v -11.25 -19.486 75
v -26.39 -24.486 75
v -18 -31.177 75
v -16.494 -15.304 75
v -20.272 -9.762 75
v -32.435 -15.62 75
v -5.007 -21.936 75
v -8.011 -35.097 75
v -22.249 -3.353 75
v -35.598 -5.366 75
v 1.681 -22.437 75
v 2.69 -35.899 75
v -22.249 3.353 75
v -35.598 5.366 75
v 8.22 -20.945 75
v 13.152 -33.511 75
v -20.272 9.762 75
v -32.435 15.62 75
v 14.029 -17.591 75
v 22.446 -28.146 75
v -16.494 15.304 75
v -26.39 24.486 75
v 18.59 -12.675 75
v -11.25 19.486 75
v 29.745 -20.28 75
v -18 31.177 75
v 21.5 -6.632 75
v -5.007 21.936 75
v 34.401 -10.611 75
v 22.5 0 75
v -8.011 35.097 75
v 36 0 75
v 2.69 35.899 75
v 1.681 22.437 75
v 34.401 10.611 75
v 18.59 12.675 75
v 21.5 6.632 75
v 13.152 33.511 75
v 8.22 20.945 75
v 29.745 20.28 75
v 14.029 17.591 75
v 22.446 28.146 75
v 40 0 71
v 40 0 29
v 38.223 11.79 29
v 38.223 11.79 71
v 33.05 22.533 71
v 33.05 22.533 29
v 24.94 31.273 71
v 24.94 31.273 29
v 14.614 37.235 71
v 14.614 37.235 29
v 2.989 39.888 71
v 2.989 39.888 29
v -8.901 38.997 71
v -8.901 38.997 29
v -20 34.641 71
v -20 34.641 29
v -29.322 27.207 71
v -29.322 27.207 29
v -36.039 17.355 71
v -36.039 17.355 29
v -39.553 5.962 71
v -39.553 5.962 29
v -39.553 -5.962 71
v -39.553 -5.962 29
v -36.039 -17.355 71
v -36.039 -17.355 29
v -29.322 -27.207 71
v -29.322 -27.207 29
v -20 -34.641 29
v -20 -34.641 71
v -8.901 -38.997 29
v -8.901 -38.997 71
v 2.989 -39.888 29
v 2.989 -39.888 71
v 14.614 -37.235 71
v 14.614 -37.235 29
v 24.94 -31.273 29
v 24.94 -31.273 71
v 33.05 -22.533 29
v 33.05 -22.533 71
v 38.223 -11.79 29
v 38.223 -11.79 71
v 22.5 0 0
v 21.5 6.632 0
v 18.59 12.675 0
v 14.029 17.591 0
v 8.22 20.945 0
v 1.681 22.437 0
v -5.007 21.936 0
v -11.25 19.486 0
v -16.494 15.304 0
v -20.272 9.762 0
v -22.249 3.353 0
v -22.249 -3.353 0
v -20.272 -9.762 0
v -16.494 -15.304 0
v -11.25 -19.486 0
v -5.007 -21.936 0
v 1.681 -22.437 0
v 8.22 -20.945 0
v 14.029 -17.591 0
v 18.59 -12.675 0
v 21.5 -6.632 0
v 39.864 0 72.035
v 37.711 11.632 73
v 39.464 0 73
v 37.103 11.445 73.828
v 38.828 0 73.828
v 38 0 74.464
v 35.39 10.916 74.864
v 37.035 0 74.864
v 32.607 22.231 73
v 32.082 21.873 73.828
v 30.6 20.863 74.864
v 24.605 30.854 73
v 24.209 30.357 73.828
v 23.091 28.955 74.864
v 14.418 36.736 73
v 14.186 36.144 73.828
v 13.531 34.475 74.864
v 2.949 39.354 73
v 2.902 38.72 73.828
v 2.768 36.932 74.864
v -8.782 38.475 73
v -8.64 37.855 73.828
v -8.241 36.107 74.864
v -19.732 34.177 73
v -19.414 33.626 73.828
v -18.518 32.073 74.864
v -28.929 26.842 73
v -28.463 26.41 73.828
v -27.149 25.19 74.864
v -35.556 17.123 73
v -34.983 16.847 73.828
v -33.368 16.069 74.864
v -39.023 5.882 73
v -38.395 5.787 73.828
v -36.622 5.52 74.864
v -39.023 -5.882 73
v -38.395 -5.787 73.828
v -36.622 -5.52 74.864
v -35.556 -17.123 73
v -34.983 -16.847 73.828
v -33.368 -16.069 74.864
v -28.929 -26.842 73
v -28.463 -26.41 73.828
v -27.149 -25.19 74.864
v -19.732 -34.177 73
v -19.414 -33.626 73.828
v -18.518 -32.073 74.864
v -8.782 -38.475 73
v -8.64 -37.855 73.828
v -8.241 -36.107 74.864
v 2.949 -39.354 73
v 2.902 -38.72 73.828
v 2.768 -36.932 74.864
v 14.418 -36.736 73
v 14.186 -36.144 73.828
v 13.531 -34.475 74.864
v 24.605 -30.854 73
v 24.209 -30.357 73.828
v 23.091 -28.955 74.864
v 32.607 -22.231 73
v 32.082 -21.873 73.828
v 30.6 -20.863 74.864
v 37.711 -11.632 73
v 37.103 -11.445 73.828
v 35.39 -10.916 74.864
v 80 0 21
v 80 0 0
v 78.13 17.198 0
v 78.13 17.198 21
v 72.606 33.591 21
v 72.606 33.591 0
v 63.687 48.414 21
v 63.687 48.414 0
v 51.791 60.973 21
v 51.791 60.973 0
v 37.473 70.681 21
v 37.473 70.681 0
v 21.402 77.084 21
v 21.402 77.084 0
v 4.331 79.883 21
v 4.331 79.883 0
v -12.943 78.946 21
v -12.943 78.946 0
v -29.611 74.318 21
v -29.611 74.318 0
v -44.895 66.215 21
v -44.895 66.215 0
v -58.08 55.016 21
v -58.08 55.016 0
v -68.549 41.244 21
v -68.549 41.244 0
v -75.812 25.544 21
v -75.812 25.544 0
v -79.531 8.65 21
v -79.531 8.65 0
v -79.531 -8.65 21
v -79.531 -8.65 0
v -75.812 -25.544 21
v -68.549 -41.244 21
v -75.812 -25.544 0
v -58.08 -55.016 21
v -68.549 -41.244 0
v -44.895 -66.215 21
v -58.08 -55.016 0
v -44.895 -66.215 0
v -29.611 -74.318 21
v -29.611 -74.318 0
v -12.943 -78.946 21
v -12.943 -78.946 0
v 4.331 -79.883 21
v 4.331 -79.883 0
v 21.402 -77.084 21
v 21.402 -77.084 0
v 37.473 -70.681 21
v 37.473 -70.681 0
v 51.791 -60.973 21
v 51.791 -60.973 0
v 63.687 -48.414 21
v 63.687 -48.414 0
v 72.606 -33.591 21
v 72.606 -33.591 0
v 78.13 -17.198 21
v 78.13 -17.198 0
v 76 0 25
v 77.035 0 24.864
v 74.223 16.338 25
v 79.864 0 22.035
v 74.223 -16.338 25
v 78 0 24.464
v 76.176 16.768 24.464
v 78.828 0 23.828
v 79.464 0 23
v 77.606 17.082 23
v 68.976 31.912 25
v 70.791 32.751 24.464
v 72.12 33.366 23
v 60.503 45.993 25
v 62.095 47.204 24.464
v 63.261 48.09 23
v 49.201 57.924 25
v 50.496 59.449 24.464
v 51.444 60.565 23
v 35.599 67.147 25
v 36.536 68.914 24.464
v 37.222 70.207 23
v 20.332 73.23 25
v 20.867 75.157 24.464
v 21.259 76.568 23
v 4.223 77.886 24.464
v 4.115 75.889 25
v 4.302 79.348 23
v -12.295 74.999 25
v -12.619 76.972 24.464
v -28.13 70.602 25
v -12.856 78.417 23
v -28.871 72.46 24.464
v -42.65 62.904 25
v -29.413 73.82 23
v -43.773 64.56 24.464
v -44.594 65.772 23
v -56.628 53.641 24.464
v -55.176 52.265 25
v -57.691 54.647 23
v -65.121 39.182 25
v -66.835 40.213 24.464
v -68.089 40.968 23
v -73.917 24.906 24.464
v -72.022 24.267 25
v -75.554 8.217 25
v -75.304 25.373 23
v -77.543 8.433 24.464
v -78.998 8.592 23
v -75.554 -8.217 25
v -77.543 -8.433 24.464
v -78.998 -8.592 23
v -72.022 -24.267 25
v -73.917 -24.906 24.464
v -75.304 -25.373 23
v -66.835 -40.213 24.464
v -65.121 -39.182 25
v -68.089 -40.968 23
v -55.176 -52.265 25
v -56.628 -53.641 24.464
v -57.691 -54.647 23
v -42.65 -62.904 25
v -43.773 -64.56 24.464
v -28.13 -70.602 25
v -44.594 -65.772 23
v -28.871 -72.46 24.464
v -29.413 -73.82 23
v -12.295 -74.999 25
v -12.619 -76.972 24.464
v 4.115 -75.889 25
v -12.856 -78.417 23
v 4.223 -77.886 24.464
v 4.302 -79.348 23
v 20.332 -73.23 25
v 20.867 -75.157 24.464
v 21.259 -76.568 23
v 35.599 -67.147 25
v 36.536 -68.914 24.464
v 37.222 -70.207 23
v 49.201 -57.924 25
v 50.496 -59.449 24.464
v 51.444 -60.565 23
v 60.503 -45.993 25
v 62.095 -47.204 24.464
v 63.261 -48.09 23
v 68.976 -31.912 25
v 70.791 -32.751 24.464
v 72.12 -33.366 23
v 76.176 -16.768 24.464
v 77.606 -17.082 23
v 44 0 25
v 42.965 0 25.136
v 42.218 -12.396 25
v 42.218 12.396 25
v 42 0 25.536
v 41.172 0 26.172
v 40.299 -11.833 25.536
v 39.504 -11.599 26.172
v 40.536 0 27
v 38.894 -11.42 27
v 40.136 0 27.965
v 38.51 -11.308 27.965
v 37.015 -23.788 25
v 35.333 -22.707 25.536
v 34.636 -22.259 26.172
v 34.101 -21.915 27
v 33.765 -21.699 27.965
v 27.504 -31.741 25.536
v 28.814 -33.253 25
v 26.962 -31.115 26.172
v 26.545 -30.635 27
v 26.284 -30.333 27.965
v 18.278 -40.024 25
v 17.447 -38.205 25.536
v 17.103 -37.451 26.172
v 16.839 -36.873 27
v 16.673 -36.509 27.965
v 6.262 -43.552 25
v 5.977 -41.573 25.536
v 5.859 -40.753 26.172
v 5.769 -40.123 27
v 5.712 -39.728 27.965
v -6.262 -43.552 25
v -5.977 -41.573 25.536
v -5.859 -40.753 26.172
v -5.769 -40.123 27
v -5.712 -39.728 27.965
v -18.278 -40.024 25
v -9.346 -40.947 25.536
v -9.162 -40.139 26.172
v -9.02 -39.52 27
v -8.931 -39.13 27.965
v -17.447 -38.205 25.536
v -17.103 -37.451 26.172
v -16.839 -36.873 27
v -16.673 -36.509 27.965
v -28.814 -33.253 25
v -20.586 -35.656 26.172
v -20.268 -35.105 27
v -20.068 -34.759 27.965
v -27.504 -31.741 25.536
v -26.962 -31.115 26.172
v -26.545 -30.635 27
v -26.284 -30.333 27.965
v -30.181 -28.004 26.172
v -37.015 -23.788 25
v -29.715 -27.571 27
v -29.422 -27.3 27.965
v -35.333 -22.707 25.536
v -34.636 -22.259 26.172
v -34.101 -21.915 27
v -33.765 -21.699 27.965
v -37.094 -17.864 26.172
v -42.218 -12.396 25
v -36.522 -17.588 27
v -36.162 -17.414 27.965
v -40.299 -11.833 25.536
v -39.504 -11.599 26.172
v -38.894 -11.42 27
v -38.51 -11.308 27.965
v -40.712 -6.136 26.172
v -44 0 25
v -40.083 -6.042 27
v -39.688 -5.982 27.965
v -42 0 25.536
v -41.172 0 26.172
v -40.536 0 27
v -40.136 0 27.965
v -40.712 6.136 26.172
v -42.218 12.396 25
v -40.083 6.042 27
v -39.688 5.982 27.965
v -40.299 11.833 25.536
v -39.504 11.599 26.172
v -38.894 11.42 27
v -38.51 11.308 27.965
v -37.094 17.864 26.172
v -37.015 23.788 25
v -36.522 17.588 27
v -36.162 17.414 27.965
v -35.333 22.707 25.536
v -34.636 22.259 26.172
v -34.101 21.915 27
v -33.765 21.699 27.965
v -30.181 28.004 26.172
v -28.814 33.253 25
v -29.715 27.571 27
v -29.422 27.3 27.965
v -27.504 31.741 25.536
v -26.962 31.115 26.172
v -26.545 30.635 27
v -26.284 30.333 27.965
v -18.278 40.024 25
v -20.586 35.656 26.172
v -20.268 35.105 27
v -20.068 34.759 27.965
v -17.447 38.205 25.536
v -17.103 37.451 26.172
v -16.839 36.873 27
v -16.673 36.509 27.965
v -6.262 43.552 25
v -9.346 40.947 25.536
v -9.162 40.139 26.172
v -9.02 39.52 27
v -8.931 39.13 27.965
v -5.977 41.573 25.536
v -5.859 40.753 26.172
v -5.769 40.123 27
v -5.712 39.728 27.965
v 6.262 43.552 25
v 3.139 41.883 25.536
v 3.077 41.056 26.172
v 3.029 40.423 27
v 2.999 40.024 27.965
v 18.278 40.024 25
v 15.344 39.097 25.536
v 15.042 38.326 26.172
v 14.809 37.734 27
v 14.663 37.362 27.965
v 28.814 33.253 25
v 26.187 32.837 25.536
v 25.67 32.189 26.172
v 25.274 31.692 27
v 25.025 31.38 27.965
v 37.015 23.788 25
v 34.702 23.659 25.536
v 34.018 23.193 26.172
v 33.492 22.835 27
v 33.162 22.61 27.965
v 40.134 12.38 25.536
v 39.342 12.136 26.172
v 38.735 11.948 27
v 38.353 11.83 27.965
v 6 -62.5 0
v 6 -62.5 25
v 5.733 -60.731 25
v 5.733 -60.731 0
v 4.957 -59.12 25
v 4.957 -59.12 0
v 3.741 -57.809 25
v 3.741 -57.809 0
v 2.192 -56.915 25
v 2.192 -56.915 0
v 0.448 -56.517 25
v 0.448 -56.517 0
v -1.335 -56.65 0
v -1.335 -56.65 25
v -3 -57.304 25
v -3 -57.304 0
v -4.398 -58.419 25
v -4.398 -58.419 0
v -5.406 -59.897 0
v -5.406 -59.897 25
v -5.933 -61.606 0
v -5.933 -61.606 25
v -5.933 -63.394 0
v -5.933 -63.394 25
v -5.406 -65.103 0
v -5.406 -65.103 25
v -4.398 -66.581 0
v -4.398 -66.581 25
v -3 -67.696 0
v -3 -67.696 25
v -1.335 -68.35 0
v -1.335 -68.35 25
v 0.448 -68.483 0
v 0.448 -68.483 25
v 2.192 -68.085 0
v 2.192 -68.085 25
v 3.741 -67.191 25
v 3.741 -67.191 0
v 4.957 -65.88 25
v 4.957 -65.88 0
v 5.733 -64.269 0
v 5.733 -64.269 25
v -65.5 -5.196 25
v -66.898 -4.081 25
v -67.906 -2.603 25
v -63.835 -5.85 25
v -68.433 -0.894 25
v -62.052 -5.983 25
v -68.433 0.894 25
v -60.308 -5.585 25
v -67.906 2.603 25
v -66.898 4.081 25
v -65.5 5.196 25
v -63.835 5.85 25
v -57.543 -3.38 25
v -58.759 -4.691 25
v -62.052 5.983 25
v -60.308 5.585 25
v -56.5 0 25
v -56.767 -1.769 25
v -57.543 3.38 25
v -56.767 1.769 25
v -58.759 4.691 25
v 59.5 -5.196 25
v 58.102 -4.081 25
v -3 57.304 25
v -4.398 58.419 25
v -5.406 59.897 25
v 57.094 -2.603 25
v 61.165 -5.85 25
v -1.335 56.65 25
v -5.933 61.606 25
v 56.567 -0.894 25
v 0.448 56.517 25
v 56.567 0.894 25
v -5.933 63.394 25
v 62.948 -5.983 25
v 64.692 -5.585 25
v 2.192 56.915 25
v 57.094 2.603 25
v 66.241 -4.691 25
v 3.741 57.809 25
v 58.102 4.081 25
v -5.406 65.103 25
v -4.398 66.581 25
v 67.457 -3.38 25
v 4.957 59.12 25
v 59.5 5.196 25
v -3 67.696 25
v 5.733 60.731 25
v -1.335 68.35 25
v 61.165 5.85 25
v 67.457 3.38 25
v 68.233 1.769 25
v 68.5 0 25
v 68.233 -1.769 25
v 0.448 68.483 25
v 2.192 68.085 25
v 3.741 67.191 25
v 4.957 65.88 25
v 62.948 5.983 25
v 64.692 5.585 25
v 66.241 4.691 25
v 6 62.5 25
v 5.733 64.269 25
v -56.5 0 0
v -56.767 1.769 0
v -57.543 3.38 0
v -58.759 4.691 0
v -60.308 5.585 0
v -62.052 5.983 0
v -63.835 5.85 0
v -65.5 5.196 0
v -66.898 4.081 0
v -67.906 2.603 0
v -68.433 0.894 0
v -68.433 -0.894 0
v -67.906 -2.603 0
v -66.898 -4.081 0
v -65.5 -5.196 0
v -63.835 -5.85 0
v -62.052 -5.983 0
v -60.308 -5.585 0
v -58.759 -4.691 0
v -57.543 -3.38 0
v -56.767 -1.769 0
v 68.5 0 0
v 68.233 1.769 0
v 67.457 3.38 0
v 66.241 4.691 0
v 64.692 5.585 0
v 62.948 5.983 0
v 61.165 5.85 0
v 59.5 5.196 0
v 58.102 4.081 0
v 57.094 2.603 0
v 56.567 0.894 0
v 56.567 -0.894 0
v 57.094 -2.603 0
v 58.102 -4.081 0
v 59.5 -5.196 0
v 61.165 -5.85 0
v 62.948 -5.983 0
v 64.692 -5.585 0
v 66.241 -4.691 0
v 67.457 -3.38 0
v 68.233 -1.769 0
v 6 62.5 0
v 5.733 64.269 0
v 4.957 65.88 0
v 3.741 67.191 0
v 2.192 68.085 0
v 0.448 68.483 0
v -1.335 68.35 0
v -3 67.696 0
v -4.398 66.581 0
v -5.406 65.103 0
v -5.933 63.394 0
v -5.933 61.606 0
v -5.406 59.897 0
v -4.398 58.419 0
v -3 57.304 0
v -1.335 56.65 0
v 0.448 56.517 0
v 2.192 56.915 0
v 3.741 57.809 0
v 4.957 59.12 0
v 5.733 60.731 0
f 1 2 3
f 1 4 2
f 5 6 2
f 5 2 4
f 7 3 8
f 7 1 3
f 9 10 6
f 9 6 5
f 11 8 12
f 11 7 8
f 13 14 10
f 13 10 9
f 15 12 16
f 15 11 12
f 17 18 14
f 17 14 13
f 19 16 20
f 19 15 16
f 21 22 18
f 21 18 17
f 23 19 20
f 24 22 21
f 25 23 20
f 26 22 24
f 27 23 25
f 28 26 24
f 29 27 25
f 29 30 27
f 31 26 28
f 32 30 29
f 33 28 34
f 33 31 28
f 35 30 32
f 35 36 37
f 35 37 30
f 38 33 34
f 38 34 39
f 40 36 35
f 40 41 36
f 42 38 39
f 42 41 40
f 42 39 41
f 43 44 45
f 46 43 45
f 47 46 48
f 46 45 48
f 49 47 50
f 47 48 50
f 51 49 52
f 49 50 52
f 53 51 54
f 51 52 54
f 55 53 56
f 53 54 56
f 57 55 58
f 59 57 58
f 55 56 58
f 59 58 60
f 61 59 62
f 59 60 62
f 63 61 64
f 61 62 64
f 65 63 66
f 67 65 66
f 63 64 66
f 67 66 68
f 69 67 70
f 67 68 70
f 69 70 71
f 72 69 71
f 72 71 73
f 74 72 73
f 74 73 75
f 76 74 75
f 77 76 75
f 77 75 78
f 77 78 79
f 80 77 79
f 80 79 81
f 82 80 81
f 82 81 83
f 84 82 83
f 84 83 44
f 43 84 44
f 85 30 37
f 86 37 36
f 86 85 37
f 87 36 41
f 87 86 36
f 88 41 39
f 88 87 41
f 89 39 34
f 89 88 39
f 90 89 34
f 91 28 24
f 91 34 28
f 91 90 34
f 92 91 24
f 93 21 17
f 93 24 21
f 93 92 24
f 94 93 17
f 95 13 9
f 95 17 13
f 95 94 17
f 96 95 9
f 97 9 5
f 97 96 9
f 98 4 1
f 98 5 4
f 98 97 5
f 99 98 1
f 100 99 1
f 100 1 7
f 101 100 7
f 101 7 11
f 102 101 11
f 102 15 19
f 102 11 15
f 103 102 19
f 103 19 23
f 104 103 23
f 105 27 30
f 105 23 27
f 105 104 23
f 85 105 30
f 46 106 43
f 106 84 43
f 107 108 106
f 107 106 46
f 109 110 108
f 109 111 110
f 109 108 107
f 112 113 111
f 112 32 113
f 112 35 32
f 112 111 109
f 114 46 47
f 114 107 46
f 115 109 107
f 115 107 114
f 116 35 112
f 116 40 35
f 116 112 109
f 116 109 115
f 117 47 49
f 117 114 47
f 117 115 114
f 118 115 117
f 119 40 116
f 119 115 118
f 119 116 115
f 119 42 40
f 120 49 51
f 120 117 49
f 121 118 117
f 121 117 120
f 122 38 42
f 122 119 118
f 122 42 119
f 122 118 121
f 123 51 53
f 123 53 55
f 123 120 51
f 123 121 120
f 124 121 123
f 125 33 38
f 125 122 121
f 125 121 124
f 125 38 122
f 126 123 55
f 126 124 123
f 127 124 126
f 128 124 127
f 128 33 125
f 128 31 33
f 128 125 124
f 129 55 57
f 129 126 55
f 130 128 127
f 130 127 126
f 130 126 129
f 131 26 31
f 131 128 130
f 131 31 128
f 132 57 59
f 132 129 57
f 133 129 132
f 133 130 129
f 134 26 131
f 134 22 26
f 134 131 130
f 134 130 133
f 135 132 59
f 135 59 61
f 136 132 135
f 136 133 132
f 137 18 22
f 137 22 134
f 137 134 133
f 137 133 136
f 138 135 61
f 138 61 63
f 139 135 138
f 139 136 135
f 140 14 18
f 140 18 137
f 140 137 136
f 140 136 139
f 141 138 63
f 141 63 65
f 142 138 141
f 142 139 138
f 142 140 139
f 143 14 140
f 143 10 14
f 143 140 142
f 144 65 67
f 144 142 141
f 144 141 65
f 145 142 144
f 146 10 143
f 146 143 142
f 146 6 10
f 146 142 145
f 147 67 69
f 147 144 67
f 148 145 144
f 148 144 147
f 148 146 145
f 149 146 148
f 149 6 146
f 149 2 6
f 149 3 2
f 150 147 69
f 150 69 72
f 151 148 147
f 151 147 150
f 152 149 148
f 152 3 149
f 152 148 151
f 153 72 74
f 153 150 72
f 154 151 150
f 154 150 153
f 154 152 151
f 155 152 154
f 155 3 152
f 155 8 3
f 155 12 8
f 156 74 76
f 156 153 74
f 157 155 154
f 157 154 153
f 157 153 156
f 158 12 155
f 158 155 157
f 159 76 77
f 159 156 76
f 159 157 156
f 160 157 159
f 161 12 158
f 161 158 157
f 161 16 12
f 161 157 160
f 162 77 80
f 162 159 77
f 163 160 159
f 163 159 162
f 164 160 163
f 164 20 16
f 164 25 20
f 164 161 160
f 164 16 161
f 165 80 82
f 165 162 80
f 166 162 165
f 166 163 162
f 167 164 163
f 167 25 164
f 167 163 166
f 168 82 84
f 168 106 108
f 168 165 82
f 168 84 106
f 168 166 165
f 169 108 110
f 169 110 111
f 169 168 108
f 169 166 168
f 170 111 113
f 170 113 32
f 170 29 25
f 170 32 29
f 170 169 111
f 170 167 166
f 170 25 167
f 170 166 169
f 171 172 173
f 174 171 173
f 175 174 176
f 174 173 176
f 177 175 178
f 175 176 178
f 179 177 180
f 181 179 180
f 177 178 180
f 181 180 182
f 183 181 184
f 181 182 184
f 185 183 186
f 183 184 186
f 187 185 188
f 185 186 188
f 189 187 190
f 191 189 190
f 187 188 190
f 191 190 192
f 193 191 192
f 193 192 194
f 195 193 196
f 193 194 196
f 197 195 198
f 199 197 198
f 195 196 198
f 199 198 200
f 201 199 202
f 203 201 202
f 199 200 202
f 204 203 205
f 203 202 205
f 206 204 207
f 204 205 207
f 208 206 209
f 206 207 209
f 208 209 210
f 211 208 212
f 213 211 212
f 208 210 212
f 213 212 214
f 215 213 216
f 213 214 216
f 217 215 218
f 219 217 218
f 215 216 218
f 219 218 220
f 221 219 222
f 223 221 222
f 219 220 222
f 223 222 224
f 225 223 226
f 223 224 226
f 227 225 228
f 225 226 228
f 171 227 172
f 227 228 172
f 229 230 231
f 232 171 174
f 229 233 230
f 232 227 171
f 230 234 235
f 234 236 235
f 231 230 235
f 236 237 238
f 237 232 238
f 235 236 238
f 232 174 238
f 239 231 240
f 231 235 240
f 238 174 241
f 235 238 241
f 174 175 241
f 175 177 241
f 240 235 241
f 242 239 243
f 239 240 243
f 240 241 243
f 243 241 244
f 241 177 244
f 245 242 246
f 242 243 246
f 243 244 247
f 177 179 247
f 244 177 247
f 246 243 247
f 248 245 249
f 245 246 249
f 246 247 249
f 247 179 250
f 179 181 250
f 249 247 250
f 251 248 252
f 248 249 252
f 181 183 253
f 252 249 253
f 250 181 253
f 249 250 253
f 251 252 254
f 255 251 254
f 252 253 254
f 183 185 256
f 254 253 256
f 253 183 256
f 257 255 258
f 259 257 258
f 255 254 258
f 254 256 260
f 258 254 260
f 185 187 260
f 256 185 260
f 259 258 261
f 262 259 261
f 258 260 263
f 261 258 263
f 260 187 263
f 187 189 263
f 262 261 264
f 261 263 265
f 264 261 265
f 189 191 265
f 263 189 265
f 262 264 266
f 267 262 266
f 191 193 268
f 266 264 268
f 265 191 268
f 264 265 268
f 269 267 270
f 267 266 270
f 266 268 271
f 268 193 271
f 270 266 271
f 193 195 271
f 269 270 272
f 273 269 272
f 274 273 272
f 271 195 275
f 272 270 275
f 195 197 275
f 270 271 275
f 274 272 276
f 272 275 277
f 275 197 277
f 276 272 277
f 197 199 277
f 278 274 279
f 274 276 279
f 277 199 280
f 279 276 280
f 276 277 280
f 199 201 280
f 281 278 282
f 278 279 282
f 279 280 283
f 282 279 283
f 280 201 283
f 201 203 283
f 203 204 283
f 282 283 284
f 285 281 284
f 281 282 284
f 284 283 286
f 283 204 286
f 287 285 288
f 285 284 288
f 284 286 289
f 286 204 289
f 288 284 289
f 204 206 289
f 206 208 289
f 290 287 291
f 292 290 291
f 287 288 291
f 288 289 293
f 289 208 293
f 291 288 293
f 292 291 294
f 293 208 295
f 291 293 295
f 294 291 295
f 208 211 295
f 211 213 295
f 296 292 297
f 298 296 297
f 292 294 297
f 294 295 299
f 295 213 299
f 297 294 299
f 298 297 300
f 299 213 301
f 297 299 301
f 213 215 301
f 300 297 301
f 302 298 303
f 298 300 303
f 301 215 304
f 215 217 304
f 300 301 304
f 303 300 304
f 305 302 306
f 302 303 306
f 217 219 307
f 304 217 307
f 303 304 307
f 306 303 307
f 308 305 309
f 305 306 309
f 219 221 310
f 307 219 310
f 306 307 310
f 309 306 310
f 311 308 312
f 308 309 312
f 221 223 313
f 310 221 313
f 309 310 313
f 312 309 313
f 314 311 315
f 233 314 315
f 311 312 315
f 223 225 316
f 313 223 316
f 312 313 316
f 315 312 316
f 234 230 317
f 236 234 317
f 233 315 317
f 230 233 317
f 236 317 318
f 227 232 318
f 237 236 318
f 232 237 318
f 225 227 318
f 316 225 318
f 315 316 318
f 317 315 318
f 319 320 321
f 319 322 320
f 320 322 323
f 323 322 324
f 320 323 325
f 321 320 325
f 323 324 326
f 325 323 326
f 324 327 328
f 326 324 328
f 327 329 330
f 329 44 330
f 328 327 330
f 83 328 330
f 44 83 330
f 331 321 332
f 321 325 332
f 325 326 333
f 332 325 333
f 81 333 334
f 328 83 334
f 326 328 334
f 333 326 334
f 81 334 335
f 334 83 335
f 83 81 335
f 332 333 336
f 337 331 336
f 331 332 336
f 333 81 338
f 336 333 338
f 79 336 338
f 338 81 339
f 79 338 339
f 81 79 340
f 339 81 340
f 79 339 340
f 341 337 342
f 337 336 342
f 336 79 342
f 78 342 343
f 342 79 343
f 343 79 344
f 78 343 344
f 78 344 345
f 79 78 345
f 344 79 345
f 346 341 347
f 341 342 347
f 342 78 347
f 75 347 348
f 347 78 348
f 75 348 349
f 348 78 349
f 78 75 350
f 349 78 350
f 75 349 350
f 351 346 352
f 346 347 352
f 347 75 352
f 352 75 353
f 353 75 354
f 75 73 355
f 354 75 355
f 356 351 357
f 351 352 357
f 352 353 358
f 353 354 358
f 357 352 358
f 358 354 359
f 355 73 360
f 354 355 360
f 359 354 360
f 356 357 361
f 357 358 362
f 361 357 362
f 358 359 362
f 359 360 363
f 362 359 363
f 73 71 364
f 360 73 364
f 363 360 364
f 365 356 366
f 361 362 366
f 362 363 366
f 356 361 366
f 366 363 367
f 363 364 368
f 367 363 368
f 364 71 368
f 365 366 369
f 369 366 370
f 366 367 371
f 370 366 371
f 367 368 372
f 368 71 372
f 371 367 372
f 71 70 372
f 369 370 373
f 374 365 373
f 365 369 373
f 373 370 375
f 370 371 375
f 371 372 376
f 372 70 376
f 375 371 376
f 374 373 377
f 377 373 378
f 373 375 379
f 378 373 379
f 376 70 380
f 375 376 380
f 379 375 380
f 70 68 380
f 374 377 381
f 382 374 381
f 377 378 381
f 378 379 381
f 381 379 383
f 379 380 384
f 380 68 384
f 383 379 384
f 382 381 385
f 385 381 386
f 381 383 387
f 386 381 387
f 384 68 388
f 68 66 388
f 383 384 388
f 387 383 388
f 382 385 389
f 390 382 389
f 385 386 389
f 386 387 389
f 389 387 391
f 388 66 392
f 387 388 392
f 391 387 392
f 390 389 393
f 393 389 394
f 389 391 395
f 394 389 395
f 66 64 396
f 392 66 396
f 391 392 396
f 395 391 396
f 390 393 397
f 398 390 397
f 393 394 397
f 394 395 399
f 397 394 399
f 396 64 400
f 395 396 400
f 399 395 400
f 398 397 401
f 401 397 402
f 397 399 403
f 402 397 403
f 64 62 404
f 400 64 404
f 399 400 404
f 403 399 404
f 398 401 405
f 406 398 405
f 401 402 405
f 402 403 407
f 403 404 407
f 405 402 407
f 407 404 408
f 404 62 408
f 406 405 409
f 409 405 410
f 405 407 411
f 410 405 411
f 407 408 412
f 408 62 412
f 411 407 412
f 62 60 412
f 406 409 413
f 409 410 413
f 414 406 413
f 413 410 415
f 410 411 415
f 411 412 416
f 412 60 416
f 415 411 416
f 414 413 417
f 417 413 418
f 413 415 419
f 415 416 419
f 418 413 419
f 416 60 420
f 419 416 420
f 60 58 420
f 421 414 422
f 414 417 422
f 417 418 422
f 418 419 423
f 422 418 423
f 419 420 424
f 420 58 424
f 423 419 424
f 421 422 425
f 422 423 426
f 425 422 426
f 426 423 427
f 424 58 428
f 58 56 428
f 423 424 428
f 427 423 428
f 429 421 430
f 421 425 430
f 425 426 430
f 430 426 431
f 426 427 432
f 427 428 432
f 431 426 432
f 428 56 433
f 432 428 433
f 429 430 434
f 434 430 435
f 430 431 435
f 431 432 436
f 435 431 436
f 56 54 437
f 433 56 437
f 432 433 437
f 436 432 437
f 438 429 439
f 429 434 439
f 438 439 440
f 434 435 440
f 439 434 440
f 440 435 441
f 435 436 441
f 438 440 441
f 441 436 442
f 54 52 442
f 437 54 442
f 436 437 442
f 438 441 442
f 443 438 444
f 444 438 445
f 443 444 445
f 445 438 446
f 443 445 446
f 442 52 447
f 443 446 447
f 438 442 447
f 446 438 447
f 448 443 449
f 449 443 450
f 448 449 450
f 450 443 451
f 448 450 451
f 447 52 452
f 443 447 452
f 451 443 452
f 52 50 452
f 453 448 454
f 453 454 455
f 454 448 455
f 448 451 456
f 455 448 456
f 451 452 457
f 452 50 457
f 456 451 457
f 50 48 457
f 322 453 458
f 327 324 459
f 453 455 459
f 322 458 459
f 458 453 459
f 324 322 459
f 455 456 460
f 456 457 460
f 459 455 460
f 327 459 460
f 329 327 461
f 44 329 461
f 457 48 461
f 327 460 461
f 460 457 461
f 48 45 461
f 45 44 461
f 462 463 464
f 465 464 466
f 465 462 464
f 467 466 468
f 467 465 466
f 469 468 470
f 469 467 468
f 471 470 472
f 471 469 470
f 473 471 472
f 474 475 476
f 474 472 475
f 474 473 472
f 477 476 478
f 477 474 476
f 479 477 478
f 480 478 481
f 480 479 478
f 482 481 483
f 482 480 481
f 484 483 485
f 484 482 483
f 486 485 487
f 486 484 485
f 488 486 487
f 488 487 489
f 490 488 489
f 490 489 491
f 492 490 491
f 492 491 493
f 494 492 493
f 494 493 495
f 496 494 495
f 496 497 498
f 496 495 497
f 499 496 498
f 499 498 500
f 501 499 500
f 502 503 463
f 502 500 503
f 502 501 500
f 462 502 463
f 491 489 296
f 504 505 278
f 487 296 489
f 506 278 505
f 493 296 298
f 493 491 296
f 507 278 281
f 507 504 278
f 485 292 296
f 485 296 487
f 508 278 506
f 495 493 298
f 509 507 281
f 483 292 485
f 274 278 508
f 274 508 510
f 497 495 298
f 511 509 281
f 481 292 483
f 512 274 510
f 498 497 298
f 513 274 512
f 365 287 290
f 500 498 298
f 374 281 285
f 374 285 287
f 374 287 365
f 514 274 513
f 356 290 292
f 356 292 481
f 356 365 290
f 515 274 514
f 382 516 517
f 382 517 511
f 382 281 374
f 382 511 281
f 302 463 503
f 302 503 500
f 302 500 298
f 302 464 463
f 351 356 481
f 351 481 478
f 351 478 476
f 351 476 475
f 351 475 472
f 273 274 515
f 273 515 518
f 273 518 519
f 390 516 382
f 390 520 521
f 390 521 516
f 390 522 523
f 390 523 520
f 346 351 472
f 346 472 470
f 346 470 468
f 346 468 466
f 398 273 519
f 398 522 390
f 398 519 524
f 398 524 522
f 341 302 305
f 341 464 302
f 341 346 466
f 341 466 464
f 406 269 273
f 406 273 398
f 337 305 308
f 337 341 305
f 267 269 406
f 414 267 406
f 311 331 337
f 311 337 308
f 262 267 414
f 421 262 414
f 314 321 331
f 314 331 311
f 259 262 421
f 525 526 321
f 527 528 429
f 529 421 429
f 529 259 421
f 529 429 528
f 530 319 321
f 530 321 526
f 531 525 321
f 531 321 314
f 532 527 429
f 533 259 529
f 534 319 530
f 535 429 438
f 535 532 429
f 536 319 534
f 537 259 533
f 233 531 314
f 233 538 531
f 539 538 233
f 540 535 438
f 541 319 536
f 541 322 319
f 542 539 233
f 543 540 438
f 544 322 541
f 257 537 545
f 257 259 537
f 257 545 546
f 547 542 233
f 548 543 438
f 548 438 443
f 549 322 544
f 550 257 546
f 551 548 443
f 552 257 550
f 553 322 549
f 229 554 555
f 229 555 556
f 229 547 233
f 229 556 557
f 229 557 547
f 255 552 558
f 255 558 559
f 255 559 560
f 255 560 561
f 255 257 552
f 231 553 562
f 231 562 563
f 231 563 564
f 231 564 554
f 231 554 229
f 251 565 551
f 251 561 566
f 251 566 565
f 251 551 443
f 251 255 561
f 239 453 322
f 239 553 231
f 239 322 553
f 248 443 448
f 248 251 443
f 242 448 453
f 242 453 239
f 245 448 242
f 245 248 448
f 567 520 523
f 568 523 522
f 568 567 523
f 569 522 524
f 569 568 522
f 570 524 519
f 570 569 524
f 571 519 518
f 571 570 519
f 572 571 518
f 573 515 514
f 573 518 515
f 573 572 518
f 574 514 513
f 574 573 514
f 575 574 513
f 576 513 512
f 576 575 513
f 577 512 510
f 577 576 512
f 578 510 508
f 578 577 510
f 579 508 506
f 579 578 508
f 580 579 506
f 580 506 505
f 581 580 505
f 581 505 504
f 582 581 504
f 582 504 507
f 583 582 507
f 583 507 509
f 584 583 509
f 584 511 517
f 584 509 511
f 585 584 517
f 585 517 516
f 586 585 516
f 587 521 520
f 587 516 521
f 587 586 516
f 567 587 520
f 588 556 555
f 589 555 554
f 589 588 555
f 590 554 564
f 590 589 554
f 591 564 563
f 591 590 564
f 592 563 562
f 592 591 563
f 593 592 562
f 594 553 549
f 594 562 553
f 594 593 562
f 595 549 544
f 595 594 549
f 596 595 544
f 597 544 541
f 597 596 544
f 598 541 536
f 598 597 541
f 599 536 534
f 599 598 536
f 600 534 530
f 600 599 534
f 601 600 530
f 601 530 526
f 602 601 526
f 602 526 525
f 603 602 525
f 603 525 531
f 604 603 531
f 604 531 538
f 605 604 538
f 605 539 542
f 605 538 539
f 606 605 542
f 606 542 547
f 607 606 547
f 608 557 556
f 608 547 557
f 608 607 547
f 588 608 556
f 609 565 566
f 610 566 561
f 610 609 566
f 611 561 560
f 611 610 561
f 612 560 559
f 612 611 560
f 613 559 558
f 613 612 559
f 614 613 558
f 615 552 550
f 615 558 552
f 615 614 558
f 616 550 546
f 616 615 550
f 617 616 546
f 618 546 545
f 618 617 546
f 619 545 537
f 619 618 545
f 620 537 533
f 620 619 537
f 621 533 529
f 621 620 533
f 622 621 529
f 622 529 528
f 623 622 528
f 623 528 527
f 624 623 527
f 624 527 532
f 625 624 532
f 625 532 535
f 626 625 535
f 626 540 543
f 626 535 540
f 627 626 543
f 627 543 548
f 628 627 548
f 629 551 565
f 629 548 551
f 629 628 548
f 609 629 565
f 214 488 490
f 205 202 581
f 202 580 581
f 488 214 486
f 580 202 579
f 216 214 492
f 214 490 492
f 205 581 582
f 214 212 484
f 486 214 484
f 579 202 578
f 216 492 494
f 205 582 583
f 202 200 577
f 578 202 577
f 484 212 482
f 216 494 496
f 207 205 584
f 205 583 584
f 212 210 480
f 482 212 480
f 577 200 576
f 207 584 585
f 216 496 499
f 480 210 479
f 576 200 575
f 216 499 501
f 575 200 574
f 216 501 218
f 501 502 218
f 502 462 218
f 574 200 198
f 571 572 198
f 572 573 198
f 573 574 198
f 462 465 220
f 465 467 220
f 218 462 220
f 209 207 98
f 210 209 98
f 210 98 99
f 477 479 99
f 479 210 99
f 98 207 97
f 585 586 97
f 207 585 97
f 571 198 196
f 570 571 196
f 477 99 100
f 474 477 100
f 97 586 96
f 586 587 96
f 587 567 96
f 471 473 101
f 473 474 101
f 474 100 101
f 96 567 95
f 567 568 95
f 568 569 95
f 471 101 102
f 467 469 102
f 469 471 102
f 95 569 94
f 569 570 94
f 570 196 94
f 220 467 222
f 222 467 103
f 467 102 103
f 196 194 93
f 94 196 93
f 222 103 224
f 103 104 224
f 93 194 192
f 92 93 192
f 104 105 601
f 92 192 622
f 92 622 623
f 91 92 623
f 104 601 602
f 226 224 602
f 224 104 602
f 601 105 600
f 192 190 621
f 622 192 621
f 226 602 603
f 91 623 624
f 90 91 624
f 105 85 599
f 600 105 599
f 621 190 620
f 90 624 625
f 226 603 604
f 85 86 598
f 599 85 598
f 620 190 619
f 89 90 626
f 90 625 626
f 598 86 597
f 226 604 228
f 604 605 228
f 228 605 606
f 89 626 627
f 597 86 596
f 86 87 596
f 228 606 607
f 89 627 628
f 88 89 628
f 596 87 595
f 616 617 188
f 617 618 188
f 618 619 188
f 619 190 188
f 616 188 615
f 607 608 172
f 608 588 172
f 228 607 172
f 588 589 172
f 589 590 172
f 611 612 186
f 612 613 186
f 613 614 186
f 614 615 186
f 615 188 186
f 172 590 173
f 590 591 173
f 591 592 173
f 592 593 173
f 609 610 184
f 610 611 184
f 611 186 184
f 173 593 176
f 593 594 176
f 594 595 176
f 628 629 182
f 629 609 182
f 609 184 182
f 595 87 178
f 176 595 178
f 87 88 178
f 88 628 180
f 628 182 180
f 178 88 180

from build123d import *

# Parameters (mm, degrees)
ESQUISSE1_R         = 80
BASE_25MM_DEPTH     = 25
ESQUISSE1_4_R       = 40
AXE75MM_DEPTH       = 75
TROU1_REACH         = 137.739
ESQUISSE1_5_R       = 6
TROU2_REACH         = 137.739
ESQUISSE1_6_R       = 6
TROU3_4_REACH       = 137.739
ESQUISSE1_7_R       = 6
TROUPRINCIPAL_REACH = 137.739
ESQUISSE1_8_R       = 22.5
CONG_1_R            = 4
CONG_2_R            = 4
CONG_3_R            = 4


with BuildPart() as part:
    # Esquisse1 → Base 25mm (new body)
    with BuildSketch(Plane.XY):
        Circle(ESQUISSE1_R)
    extrude(amount=BASE_25MM_DEPTH)

    # Esquisse1<4> → axe75mm (add)
    with BuildSketch(Plane.XY):
        Circle(ESQUISSE1_4_R)
    extrude(amount=AXE75MM_DEPTH)

    # Esquisse1<5> → Trou1 (cut, up to next)
    with BuildSketch(Plane.XY, mode=Mode.PRIVATE) as trou1_sk1:
        with Locations((0, 62.5)):
            Circle(ESQUISSE1_5_R)
    trou1_tool1 = extrude(trou1_sk1.sketch, amount=TROU1_REACH, mode=Mode.PRIVATE) & part.part
    add(trou1_tool1.solids().sort_by_distance((0, 62.5, 0))[0], mode=Mode.SUBTRACT)

    # Esquisse1<6> → Trou2 (cut, up to next)
    with BuildSketch(Plane.XY, mode=Mode.PRIVATE) as trou2_sk1:
        with Locations((-62.5, 0)):
            Circle(ESQUISSE1_6_R)
    trou2_tool1 = extrude(trou2_sk1.sketch, amount=TROU2_REACH, mode=Mode.PRIVATE) & part.part
    add(trou2_tool1.solids().sort_by_distance((-62.5, 0, 0))[0], mode=Mode.SUBTRACT)

    # Esquisse1<7> → Trou3&4 (cut, up to next)
    with BuildSketch(Plane.XY, mode=Mode.PRIVATE) as trou3_4_sk1:
        with Locations((62.5, 0)):
            Circle(ESQUISSE1_7_R)
    trou3_4_tool1 = extrude(trou3_4_sk1.sketch, amount=TROU3_4_REACH, mode=Mode.PRIVATE) & part.part
    # Esquisse1<7> → Trou3&4 (cut, up to next)
    with BuildSketch(Plane.XY, mode=Mode.PRIVATE) as trou3_4_sk2:
        with Locations((0, -62.5)):
            Circle(ESQUISSE1_7_R)
    trou3_4_tool2 = extrude(trou3_4_sk2.sketch, amount=TROU3_4_REACH, mode=Mode.PRIVATE) & part.part
    add(trou3_4_tool1.solids().sort_by_distance((62.5, 0, 0))[0], mode=Mode.SUBTRACT)
    add(trou3_4_tool2.solids().sort_by_distance((0, -62.5, 0))[0], mode=Mode.SUBTRACT)

    # Esquisse1<8> → TrouPrincipal (cut, up to next)
    with BuildSketch(Plane.XY, mode=Mode.PRIVATE) as trouprincipal_sk1:
        Circle(ESQUISSE1_8_R)
    trouprincipal_tool1 = extrude(trouprincipal_sk1.sketch, amount=TROUPRINCIPAL_REACH, mode=Mode.PRIVATE) & part.part
    add(trouprincipal_tool1.solids().sort_by_distance((0, 0, 0))[0], mode=Mode.SUBTRACT)

    # Congé1
    cong_1_edges = [part.edges().sort_by_distance(p)[0] for p in [
        (-40, 0, 25),
    ]]
    fillet(cong_1_edges, radius=CONG_1_R)

    # Congé2
    cong_2_edges = [part.edges().sort_by_distance(p)[0] for p in [
        (-80, 0, 25),
    ]]
    fillet(cong_2_edges, radius=CONG_2_R)

    # Congé3
    cong_3_edges = [part.edges().sort_by_distance(p)[0] for p in [
        (-40, 0, 75),
    ]]
    fillet(cong_3_edges, radius=CONG_3_R)


solid = part.part
